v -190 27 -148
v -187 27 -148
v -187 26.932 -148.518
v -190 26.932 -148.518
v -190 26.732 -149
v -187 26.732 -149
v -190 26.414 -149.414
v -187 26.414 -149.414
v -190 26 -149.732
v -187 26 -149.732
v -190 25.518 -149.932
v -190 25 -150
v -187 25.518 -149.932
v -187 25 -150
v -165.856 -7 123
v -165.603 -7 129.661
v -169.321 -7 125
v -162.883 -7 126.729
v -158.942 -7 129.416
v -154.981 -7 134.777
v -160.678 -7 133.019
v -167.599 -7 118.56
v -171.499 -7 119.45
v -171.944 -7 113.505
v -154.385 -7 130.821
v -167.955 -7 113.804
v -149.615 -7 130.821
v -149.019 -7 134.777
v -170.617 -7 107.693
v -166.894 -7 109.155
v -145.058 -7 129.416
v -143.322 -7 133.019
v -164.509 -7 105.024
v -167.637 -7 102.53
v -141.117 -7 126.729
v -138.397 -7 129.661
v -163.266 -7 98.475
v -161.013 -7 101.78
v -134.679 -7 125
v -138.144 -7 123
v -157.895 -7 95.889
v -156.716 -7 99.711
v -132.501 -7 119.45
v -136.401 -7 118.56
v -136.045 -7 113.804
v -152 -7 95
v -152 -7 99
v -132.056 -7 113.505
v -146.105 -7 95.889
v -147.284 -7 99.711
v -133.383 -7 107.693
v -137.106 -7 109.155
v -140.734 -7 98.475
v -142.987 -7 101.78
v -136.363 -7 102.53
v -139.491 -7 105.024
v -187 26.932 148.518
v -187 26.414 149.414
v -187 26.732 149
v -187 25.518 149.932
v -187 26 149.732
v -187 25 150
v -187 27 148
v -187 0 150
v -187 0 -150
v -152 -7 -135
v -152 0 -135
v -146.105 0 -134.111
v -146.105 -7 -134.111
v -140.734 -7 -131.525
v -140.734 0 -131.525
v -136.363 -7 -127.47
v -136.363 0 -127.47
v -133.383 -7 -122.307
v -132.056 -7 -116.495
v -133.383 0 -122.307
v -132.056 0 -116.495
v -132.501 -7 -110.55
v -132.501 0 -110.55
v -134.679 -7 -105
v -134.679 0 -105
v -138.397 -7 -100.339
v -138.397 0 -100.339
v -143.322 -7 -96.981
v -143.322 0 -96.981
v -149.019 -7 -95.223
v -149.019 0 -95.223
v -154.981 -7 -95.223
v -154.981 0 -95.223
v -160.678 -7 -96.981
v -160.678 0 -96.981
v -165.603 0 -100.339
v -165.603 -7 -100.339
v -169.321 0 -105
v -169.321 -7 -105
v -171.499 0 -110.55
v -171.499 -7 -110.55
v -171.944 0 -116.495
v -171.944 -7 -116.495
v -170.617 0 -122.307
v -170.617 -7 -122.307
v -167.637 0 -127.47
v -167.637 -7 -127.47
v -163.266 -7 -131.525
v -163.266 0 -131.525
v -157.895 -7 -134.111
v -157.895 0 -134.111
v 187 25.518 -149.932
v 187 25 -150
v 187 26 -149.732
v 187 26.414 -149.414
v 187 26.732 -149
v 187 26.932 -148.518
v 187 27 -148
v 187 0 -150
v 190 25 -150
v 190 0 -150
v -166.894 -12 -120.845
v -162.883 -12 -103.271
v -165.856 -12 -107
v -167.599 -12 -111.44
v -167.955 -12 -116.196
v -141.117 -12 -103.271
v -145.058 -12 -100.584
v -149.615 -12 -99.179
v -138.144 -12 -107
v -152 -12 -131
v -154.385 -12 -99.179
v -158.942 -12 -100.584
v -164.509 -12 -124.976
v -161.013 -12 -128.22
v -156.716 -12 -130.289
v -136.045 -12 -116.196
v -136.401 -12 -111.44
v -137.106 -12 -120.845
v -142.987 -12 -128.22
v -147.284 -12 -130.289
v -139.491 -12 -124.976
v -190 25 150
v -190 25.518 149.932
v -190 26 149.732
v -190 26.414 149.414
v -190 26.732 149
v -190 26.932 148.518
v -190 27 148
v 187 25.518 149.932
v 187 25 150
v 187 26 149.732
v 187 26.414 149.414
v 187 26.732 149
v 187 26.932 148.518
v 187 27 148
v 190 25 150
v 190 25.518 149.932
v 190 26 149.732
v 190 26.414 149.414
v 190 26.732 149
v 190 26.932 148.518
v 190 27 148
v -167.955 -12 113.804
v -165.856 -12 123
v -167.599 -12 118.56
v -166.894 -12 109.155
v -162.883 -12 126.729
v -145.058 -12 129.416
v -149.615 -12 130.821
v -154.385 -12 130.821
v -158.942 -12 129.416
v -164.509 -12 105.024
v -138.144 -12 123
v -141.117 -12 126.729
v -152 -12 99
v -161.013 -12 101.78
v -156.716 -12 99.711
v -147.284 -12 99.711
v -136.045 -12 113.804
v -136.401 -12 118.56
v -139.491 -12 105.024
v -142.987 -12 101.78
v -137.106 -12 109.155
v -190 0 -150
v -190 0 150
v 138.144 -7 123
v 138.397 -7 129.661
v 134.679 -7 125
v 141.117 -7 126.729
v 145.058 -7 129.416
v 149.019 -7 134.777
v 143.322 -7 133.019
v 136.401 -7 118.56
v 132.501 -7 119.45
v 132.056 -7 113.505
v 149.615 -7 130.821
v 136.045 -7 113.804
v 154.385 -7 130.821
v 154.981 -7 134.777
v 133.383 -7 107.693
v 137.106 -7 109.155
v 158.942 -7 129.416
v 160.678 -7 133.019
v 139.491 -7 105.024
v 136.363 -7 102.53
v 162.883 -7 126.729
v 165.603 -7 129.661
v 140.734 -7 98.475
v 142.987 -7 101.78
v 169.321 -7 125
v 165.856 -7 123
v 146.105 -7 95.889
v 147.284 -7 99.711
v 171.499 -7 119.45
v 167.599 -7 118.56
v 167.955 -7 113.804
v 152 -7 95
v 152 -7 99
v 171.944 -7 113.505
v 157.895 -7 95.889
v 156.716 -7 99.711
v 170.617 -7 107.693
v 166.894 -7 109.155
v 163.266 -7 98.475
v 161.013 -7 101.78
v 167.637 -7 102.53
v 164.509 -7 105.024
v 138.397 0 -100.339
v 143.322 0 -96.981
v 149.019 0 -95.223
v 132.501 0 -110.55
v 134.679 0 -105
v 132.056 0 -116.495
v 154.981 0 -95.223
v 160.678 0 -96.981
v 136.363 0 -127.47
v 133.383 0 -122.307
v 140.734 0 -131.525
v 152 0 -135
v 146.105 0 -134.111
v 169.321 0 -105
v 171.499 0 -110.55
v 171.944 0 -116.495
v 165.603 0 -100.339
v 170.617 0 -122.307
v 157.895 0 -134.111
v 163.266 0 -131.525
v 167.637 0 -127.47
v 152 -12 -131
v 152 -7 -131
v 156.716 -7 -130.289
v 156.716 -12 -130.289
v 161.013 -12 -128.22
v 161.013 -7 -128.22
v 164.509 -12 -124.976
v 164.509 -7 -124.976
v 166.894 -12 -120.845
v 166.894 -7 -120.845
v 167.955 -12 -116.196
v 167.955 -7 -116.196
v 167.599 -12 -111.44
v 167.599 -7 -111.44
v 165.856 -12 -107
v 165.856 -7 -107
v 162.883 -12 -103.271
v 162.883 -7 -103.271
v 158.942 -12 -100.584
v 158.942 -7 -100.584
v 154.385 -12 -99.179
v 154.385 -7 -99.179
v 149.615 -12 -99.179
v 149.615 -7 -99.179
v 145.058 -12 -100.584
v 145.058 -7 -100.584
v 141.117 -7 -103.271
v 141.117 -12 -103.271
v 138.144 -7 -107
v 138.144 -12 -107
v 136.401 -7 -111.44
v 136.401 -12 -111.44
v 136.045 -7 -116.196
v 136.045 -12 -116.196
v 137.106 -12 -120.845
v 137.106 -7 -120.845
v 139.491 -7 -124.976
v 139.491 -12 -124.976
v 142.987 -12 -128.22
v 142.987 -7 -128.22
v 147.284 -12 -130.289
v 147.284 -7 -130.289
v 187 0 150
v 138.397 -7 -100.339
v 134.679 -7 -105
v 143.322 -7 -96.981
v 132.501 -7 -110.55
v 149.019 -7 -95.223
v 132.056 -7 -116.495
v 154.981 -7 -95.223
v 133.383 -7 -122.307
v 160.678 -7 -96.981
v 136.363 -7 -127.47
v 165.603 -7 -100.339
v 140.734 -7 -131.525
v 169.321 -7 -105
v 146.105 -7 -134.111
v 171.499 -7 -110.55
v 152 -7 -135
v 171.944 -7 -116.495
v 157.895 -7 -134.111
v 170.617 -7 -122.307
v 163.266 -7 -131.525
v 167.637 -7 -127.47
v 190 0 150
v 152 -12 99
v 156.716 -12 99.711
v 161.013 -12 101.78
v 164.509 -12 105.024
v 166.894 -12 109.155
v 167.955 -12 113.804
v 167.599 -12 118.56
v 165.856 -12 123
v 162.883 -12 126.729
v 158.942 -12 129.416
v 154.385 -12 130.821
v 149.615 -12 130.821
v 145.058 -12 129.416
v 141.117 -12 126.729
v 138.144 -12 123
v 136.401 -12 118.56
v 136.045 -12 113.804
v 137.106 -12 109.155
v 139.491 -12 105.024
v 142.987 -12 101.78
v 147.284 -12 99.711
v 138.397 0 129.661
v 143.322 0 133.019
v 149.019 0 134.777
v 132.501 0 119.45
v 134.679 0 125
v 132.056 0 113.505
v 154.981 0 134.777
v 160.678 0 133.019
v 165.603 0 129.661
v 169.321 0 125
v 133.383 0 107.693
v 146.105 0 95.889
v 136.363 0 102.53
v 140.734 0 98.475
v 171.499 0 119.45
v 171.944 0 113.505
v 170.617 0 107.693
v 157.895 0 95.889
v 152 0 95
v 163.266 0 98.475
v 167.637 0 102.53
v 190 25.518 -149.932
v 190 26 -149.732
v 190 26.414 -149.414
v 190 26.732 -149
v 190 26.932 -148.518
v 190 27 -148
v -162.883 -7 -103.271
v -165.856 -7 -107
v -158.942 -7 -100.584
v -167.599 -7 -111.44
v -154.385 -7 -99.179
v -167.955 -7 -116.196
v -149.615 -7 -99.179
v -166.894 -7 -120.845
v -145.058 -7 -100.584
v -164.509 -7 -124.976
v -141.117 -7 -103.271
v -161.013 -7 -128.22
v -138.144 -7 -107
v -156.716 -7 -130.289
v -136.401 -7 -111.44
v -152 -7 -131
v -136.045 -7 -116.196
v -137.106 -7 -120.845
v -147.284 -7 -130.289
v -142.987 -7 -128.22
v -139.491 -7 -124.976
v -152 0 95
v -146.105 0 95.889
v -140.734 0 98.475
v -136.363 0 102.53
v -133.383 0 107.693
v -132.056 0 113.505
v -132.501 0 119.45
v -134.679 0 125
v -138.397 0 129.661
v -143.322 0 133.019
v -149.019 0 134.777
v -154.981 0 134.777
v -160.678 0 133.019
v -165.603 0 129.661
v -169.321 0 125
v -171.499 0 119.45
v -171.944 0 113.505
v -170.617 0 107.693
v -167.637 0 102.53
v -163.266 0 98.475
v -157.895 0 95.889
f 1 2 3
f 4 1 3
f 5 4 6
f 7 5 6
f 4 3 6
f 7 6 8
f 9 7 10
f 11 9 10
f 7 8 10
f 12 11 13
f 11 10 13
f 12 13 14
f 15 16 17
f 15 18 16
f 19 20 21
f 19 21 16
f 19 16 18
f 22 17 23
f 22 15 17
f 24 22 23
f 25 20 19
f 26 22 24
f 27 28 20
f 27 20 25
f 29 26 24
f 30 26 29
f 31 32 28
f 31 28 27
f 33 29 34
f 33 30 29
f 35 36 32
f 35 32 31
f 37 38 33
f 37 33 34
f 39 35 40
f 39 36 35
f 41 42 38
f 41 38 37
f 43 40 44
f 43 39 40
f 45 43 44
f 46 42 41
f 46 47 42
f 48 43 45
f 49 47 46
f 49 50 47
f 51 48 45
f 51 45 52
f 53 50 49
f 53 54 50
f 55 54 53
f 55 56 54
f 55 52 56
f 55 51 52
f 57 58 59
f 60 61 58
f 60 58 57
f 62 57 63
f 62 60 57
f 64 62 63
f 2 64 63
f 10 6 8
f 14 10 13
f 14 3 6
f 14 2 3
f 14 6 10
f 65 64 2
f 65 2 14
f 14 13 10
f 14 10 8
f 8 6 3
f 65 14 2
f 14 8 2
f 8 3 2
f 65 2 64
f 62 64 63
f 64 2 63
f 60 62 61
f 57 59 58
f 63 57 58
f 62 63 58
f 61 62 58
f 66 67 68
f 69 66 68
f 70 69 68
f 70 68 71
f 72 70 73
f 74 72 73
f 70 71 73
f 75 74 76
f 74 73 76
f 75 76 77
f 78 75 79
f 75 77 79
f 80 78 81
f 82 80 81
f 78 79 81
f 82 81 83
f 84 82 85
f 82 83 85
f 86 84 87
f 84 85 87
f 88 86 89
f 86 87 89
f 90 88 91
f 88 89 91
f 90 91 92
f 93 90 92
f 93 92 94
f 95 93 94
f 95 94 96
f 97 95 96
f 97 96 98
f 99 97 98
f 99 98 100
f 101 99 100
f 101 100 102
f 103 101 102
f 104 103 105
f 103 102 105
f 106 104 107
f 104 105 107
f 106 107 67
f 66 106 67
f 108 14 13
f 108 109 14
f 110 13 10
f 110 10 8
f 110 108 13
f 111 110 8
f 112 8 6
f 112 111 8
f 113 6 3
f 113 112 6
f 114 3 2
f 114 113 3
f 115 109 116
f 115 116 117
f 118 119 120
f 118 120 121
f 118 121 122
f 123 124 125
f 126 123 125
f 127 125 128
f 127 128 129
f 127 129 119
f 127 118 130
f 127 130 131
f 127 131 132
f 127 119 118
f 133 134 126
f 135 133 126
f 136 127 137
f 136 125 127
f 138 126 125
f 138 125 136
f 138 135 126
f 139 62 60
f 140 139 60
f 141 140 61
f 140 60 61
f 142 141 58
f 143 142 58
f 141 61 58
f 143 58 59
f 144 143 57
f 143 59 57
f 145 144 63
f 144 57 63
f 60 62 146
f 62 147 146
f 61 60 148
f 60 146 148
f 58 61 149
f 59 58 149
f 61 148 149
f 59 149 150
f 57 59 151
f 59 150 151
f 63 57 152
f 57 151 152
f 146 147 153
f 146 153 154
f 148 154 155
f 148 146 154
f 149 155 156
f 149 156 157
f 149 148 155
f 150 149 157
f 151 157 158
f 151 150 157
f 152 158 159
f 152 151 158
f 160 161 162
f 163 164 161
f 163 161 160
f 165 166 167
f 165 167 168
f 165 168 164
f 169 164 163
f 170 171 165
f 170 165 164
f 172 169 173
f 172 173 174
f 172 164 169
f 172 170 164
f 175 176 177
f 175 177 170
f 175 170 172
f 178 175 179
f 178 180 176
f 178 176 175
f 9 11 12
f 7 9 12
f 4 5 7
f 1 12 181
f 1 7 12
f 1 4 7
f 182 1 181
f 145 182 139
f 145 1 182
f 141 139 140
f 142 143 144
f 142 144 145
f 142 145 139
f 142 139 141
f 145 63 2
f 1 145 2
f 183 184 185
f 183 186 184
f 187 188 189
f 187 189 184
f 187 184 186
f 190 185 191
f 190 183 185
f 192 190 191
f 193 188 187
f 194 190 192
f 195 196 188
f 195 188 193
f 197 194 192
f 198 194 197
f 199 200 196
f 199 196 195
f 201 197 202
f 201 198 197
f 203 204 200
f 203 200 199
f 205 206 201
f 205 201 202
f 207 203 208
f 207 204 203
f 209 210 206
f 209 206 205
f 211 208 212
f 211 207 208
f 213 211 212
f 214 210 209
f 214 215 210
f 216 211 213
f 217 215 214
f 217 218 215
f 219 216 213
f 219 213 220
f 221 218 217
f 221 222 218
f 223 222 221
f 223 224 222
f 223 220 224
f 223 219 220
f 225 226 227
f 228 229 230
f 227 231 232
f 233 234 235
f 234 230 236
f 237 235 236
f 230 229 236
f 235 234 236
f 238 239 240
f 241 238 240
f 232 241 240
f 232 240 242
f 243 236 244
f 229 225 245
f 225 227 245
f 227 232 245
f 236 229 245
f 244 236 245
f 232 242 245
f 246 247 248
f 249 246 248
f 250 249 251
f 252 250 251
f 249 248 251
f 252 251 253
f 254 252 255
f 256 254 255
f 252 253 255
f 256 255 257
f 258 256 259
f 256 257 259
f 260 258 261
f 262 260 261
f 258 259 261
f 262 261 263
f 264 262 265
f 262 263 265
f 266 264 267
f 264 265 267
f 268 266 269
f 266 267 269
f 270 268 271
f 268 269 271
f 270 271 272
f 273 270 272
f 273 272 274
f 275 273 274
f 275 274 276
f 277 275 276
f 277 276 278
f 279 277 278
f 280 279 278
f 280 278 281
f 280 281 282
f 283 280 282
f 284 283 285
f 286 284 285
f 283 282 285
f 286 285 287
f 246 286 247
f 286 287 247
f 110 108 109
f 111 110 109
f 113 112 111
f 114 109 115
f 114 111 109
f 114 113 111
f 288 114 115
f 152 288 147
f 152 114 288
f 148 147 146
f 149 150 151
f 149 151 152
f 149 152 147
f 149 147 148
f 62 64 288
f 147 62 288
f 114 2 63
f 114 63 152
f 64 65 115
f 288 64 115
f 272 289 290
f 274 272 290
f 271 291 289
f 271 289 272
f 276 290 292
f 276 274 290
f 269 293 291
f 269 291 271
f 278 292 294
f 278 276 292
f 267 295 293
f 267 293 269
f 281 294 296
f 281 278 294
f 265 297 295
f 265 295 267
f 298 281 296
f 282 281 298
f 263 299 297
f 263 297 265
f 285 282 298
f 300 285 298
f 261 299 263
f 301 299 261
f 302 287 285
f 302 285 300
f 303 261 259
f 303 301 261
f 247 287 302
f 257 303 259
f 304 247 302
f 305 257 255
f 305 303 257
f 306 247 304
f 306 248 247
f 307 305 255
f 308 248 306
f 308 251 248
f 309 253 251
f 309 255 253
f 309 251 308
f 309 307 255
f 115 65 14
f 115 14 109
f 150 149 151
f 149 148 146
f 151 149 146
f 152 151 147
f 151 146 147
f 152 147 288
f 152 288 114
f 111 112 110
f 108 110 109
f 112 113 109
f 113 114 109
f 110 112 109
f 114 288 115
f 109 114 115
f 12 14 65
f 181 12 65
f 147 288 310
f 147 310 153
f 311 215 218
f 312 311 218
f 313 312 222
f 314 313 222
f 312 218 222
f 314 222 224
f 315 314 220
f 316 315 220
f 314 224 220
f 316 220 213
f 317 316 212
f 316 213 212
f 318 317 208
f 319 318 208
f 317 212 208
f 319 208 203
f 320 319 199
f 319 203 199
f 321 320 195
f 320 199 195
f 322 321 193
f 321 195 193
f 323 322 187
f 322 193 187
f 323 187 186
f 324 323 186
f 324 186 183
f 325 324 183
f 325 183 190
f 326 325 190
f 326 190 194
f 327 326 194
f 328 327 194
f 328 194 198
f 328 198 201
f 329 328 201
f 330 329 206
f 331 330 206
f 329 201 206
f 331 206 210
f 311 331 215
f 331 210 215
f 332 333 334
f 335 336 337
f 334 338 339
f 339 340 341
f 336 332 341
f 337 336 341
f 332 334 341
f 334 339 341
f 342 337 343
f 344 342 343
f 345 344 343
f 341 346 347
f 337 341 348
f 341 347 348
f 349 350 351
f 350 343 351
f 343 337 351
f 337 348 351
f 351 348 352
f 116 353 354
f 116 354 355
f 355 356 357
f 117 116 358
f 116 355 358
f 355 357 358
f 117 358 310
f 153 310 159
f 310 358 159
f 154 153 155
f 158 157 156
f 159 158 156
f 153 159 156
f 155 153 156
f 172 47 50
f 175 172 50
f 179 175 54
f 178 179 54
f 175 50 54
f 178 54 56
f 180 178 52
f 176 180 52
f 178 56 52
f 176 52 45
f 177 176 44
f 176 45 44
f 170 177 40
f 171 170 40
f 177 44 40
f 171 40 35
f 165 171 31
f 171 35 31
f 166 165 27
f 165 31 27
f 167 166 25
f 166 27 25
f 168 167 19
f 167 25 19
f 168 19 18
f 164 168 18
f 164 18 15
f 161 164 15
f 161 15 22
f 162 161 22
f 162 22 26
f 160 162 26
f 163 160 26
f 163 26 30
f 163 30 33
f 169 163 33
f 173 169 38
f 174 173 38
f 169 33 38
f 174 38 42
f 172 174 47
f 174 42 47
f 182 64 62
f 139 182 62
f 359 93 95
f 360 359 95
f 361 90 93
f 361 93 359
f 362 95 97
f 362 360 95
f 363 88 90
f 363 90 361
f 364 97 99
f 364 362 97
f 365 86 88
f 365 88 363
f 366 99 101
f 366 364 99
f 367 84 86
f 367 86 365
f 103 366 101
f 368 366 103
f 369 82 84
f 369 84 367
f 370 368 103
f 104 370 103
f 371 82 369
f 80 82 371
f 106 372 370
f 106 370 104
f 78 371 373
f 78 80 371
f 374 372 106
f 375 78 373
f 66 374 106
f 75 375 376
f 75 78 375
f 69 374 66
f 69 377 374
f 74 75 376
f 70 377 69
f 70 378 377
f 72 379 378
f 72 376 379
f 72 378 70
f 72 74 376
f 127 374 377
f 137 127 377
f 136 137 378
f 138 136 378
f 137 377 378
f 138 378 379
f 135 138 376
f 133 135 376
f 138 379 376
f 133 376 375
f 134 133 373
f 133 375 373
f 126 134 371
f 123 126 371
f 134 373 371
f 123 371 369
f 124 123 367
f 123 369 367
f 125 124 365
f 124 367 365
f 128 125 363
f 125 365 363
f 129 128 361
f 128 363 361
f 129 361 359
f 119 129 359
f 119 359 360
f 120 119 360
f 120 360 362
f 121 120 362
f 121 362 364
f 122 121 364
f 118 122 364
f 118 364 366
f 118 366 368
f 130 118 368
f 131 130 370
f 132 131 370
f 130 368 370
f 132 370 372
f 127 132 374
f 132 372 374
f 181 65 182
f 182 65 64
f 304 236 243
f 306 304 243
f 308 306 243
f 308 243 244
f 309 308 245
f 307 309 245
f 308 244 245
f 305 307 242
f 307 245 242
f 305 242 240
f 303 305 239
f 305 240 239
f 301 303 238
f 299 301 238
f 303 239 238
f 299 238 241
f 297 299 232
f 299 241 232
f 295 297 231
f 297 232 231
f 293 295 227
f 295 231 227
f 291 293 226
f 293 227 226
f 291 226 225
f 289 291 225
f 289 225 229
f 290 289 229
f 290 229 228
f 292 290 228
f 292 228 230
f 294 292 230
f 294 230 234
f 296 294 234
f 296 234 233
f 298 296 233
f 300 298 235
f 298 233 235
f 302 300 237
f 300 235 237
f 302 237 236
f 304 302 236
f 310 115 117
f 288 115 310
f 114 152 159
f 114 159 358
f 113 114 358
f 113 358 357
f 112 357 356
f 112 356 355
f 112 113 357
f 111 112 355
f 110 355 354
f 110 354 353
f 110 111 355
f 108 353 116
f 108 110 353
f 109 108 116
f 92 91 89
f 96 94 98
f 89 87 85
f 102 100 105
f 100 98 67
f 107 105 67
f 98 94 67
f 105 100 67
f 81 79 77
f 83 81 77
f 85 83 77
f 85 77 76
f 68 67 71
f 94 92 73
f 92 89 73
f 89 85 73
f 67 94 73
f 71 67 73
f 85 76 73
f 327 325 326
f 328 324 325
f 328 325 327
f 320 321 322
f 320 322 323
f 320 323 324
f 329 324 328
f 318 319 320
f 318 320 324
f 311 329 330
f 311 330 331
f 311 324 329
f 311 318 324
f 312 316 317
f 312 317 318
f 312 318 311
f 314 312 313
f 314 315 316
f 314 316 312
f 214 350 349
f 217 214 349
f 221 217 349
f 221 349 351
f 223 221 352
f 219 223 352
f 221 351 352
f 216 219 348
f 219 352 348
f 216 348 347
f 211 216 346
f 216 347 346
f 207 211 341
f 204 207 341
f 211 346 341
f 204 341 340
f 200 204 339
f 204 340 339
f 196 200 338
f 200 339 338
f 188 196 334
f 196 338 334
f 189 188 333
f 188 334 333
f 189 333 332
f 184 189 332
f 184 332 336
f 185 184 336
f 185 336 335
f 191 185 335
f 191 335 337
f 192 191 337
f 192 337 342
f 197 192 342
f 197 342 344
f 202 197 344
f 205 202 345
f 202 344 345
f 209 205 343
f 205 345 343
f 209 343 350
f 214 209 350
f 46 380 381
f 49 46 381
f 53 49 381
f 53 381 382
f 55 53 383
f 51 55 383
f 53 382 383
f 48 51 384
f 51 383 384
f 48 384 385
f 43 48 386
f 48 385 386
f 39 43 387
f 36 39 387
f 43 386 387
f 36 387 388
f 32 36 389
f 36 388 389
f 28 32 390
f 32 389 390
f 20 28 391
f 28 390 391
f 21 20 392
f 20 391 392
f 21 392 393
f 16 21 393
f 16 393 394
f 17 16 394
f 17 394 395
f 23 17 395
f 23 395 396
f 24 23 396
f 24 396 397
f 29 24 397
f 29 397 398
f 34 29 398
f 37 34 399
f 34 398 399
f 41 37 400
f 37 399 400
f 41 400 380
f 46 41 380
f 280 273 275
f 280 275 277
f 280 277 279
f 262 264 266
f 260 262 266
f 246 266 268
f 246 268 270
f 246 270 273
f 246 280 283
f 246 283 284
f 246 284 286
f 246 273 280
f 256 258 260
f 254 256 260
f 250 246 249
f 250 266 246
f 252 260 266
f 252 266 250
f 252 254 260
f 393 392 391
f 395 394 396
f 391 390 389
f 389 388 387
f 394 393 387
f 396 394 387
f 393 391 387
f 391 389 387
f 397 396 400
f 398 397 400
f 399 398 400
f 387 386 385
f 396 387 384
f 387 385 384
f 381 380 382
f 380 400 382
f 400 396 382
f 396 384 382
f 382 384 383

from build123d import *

# Parameters (mm, degrees)
SKETCH1_W           = 374
SKETCH1_H           = 300
BODY_DEPTH          = 27
SKETCH2_R           = 20
FEET_DEPTH          = 7
FEET_2_DEPTH        = 7
FEET_3_DEPTH        = 7
FEET_4_DEPTH        = 7
EDGES_2_R           = 2
END_CAP_A_DEPTH     = 3
END_START           = -374
END_CAP_B_DEPTH     = 3
SKETCH5_R           = 16
BOSS_EXTRUDE8_DEPTH = 5


with BuildPart() as part:
    # Sketch1 → Body (new body)
    with BuildSketch(Plane(origin=(0, 0, 0), x_dir=(1, 0, 0), z_dir=(0, 1, 0))):
        Rectangle(SKETCH1_W, SKETCH1_H)
    extrude(amount=BODY_DEPTH)

    # Edges 2
    edges_2_edges = [part.edges().sort_by_distance(p)[0] for p in [
        (0, 27, 150),
        (0, 27, -150),
    ]]
    fillet(edges_2_edges, radius=EDGES_2_R)


with BuildPart() as body_2:
    # Sketch2 → Feet (new body)
    with BuildSketch(Plane.XZ):
        with Locations(Location((-152, 115, 0), (0, 0, 270))):
            Circle(SKETCH2_R)
    extrude(amount=FEET_DEPTH)



with BuildPart() as body_3:
    # Sketch2 → Feet 2 (new body)
    with BuildSketch(Plane.XZ):
        with Locations(Location((152, 115, 0), (0, 0, 270))):
            Circle(SKETCH2_R)
    extrude(amount=FEET_2_DEPTH)


with BuildPart() as body_4:
    # Sketch2 → Feet 3 (new body)
    with BuildSketch(Plane.XZ):
        with Locations(Location((-152, -115, 0), (0, 0, 270))):
            Circle(SKETCH2_R)
    extrude(amount=FEET_3_DEPTH)


with BuildPart() as body_5:
    # Sketch2 → Feet 4 (new body)
    with BuildSketch(Plane.XZ):
        with Locations(Location((152, -115, 0), (0, 0, 270))):
            Circle(SKETCH2_R)
    extrude(amount=FEET_4_DEPTH)


with BuildPart() as body_6:
    # Sketch4 → End Cap A (new body)
    with BuildSketch(Plane.ZY.offset(187)):
        with BuildLine():
            Line((148, 27), (-148, 27))
            ThreePointArc((-148, 27), (-149.414213562, 26.414213562), (-150, 25))
            Line((-150, 25), (-150, 0))
            Line((-150, 0), (150, 0))
            Line((150, 0), (150, 25))
            ThreePointArc((150, 25), (149.414213562, 26.414213562), (148, 27))
        make_face()
    extrude(amount=END_CAP_A_DEPTH)


with BuildPart() as body_7:
    # Sketch4<2> → End Cap B (new body)
    with BuildSketch(Plane.ZY.offset(187).offset(END_START)):
        with BuildLine():
            Line((148, 27), (-148, 27))
            ThreePointArc((-148, 27), (-149.414213562, 26.414213562), (-150, 25))
            Line((-150, 25), (-150, 0))
            Line((-150, 0), (150, 0))
            Line((150, 0), (150, 25))
            ThreePointArc((150, 25), (149.414213562, 26.414213562), (148, 27))
        make_face()
    extrude(amount=-END_CAP_B_DEPTH)


with BuildPart() as body_2_1:
    add(body_2.part)

    add(body_3.part)  # Boss-Extrude8 merges body 3

    add(body_4.part)  # Boss-Extrude8 merges body 4

    add(body_5.part)  # Boss-Extrude8 merges body 5
    # Sketch5 → Boss-Extrude8 (add)
    with BuildSketch(Plane.XZ.offset(7)):
        with Locations(Location((-152, 115, 0), (0, 0, 270))):
            Circle(SKETCH5_R)
        with Locations(Location((152, 115, 0), (0, 0, 270))):
            Circle(SKETCH5_R)
        with Locations(Location((152, -115, 0), (0, 0, 270))):
            Circle(SKETCH5_R)
        with Locations(Location((-152, -115, 0), (0, 0, 270))):
            Circle(SKETCH5_R)
    extrude(amount=BOSS_EXTRUDE8_DEPTH)


solid = Compound([part.part, body_6.part, body_7.part, body_2_1.part])
